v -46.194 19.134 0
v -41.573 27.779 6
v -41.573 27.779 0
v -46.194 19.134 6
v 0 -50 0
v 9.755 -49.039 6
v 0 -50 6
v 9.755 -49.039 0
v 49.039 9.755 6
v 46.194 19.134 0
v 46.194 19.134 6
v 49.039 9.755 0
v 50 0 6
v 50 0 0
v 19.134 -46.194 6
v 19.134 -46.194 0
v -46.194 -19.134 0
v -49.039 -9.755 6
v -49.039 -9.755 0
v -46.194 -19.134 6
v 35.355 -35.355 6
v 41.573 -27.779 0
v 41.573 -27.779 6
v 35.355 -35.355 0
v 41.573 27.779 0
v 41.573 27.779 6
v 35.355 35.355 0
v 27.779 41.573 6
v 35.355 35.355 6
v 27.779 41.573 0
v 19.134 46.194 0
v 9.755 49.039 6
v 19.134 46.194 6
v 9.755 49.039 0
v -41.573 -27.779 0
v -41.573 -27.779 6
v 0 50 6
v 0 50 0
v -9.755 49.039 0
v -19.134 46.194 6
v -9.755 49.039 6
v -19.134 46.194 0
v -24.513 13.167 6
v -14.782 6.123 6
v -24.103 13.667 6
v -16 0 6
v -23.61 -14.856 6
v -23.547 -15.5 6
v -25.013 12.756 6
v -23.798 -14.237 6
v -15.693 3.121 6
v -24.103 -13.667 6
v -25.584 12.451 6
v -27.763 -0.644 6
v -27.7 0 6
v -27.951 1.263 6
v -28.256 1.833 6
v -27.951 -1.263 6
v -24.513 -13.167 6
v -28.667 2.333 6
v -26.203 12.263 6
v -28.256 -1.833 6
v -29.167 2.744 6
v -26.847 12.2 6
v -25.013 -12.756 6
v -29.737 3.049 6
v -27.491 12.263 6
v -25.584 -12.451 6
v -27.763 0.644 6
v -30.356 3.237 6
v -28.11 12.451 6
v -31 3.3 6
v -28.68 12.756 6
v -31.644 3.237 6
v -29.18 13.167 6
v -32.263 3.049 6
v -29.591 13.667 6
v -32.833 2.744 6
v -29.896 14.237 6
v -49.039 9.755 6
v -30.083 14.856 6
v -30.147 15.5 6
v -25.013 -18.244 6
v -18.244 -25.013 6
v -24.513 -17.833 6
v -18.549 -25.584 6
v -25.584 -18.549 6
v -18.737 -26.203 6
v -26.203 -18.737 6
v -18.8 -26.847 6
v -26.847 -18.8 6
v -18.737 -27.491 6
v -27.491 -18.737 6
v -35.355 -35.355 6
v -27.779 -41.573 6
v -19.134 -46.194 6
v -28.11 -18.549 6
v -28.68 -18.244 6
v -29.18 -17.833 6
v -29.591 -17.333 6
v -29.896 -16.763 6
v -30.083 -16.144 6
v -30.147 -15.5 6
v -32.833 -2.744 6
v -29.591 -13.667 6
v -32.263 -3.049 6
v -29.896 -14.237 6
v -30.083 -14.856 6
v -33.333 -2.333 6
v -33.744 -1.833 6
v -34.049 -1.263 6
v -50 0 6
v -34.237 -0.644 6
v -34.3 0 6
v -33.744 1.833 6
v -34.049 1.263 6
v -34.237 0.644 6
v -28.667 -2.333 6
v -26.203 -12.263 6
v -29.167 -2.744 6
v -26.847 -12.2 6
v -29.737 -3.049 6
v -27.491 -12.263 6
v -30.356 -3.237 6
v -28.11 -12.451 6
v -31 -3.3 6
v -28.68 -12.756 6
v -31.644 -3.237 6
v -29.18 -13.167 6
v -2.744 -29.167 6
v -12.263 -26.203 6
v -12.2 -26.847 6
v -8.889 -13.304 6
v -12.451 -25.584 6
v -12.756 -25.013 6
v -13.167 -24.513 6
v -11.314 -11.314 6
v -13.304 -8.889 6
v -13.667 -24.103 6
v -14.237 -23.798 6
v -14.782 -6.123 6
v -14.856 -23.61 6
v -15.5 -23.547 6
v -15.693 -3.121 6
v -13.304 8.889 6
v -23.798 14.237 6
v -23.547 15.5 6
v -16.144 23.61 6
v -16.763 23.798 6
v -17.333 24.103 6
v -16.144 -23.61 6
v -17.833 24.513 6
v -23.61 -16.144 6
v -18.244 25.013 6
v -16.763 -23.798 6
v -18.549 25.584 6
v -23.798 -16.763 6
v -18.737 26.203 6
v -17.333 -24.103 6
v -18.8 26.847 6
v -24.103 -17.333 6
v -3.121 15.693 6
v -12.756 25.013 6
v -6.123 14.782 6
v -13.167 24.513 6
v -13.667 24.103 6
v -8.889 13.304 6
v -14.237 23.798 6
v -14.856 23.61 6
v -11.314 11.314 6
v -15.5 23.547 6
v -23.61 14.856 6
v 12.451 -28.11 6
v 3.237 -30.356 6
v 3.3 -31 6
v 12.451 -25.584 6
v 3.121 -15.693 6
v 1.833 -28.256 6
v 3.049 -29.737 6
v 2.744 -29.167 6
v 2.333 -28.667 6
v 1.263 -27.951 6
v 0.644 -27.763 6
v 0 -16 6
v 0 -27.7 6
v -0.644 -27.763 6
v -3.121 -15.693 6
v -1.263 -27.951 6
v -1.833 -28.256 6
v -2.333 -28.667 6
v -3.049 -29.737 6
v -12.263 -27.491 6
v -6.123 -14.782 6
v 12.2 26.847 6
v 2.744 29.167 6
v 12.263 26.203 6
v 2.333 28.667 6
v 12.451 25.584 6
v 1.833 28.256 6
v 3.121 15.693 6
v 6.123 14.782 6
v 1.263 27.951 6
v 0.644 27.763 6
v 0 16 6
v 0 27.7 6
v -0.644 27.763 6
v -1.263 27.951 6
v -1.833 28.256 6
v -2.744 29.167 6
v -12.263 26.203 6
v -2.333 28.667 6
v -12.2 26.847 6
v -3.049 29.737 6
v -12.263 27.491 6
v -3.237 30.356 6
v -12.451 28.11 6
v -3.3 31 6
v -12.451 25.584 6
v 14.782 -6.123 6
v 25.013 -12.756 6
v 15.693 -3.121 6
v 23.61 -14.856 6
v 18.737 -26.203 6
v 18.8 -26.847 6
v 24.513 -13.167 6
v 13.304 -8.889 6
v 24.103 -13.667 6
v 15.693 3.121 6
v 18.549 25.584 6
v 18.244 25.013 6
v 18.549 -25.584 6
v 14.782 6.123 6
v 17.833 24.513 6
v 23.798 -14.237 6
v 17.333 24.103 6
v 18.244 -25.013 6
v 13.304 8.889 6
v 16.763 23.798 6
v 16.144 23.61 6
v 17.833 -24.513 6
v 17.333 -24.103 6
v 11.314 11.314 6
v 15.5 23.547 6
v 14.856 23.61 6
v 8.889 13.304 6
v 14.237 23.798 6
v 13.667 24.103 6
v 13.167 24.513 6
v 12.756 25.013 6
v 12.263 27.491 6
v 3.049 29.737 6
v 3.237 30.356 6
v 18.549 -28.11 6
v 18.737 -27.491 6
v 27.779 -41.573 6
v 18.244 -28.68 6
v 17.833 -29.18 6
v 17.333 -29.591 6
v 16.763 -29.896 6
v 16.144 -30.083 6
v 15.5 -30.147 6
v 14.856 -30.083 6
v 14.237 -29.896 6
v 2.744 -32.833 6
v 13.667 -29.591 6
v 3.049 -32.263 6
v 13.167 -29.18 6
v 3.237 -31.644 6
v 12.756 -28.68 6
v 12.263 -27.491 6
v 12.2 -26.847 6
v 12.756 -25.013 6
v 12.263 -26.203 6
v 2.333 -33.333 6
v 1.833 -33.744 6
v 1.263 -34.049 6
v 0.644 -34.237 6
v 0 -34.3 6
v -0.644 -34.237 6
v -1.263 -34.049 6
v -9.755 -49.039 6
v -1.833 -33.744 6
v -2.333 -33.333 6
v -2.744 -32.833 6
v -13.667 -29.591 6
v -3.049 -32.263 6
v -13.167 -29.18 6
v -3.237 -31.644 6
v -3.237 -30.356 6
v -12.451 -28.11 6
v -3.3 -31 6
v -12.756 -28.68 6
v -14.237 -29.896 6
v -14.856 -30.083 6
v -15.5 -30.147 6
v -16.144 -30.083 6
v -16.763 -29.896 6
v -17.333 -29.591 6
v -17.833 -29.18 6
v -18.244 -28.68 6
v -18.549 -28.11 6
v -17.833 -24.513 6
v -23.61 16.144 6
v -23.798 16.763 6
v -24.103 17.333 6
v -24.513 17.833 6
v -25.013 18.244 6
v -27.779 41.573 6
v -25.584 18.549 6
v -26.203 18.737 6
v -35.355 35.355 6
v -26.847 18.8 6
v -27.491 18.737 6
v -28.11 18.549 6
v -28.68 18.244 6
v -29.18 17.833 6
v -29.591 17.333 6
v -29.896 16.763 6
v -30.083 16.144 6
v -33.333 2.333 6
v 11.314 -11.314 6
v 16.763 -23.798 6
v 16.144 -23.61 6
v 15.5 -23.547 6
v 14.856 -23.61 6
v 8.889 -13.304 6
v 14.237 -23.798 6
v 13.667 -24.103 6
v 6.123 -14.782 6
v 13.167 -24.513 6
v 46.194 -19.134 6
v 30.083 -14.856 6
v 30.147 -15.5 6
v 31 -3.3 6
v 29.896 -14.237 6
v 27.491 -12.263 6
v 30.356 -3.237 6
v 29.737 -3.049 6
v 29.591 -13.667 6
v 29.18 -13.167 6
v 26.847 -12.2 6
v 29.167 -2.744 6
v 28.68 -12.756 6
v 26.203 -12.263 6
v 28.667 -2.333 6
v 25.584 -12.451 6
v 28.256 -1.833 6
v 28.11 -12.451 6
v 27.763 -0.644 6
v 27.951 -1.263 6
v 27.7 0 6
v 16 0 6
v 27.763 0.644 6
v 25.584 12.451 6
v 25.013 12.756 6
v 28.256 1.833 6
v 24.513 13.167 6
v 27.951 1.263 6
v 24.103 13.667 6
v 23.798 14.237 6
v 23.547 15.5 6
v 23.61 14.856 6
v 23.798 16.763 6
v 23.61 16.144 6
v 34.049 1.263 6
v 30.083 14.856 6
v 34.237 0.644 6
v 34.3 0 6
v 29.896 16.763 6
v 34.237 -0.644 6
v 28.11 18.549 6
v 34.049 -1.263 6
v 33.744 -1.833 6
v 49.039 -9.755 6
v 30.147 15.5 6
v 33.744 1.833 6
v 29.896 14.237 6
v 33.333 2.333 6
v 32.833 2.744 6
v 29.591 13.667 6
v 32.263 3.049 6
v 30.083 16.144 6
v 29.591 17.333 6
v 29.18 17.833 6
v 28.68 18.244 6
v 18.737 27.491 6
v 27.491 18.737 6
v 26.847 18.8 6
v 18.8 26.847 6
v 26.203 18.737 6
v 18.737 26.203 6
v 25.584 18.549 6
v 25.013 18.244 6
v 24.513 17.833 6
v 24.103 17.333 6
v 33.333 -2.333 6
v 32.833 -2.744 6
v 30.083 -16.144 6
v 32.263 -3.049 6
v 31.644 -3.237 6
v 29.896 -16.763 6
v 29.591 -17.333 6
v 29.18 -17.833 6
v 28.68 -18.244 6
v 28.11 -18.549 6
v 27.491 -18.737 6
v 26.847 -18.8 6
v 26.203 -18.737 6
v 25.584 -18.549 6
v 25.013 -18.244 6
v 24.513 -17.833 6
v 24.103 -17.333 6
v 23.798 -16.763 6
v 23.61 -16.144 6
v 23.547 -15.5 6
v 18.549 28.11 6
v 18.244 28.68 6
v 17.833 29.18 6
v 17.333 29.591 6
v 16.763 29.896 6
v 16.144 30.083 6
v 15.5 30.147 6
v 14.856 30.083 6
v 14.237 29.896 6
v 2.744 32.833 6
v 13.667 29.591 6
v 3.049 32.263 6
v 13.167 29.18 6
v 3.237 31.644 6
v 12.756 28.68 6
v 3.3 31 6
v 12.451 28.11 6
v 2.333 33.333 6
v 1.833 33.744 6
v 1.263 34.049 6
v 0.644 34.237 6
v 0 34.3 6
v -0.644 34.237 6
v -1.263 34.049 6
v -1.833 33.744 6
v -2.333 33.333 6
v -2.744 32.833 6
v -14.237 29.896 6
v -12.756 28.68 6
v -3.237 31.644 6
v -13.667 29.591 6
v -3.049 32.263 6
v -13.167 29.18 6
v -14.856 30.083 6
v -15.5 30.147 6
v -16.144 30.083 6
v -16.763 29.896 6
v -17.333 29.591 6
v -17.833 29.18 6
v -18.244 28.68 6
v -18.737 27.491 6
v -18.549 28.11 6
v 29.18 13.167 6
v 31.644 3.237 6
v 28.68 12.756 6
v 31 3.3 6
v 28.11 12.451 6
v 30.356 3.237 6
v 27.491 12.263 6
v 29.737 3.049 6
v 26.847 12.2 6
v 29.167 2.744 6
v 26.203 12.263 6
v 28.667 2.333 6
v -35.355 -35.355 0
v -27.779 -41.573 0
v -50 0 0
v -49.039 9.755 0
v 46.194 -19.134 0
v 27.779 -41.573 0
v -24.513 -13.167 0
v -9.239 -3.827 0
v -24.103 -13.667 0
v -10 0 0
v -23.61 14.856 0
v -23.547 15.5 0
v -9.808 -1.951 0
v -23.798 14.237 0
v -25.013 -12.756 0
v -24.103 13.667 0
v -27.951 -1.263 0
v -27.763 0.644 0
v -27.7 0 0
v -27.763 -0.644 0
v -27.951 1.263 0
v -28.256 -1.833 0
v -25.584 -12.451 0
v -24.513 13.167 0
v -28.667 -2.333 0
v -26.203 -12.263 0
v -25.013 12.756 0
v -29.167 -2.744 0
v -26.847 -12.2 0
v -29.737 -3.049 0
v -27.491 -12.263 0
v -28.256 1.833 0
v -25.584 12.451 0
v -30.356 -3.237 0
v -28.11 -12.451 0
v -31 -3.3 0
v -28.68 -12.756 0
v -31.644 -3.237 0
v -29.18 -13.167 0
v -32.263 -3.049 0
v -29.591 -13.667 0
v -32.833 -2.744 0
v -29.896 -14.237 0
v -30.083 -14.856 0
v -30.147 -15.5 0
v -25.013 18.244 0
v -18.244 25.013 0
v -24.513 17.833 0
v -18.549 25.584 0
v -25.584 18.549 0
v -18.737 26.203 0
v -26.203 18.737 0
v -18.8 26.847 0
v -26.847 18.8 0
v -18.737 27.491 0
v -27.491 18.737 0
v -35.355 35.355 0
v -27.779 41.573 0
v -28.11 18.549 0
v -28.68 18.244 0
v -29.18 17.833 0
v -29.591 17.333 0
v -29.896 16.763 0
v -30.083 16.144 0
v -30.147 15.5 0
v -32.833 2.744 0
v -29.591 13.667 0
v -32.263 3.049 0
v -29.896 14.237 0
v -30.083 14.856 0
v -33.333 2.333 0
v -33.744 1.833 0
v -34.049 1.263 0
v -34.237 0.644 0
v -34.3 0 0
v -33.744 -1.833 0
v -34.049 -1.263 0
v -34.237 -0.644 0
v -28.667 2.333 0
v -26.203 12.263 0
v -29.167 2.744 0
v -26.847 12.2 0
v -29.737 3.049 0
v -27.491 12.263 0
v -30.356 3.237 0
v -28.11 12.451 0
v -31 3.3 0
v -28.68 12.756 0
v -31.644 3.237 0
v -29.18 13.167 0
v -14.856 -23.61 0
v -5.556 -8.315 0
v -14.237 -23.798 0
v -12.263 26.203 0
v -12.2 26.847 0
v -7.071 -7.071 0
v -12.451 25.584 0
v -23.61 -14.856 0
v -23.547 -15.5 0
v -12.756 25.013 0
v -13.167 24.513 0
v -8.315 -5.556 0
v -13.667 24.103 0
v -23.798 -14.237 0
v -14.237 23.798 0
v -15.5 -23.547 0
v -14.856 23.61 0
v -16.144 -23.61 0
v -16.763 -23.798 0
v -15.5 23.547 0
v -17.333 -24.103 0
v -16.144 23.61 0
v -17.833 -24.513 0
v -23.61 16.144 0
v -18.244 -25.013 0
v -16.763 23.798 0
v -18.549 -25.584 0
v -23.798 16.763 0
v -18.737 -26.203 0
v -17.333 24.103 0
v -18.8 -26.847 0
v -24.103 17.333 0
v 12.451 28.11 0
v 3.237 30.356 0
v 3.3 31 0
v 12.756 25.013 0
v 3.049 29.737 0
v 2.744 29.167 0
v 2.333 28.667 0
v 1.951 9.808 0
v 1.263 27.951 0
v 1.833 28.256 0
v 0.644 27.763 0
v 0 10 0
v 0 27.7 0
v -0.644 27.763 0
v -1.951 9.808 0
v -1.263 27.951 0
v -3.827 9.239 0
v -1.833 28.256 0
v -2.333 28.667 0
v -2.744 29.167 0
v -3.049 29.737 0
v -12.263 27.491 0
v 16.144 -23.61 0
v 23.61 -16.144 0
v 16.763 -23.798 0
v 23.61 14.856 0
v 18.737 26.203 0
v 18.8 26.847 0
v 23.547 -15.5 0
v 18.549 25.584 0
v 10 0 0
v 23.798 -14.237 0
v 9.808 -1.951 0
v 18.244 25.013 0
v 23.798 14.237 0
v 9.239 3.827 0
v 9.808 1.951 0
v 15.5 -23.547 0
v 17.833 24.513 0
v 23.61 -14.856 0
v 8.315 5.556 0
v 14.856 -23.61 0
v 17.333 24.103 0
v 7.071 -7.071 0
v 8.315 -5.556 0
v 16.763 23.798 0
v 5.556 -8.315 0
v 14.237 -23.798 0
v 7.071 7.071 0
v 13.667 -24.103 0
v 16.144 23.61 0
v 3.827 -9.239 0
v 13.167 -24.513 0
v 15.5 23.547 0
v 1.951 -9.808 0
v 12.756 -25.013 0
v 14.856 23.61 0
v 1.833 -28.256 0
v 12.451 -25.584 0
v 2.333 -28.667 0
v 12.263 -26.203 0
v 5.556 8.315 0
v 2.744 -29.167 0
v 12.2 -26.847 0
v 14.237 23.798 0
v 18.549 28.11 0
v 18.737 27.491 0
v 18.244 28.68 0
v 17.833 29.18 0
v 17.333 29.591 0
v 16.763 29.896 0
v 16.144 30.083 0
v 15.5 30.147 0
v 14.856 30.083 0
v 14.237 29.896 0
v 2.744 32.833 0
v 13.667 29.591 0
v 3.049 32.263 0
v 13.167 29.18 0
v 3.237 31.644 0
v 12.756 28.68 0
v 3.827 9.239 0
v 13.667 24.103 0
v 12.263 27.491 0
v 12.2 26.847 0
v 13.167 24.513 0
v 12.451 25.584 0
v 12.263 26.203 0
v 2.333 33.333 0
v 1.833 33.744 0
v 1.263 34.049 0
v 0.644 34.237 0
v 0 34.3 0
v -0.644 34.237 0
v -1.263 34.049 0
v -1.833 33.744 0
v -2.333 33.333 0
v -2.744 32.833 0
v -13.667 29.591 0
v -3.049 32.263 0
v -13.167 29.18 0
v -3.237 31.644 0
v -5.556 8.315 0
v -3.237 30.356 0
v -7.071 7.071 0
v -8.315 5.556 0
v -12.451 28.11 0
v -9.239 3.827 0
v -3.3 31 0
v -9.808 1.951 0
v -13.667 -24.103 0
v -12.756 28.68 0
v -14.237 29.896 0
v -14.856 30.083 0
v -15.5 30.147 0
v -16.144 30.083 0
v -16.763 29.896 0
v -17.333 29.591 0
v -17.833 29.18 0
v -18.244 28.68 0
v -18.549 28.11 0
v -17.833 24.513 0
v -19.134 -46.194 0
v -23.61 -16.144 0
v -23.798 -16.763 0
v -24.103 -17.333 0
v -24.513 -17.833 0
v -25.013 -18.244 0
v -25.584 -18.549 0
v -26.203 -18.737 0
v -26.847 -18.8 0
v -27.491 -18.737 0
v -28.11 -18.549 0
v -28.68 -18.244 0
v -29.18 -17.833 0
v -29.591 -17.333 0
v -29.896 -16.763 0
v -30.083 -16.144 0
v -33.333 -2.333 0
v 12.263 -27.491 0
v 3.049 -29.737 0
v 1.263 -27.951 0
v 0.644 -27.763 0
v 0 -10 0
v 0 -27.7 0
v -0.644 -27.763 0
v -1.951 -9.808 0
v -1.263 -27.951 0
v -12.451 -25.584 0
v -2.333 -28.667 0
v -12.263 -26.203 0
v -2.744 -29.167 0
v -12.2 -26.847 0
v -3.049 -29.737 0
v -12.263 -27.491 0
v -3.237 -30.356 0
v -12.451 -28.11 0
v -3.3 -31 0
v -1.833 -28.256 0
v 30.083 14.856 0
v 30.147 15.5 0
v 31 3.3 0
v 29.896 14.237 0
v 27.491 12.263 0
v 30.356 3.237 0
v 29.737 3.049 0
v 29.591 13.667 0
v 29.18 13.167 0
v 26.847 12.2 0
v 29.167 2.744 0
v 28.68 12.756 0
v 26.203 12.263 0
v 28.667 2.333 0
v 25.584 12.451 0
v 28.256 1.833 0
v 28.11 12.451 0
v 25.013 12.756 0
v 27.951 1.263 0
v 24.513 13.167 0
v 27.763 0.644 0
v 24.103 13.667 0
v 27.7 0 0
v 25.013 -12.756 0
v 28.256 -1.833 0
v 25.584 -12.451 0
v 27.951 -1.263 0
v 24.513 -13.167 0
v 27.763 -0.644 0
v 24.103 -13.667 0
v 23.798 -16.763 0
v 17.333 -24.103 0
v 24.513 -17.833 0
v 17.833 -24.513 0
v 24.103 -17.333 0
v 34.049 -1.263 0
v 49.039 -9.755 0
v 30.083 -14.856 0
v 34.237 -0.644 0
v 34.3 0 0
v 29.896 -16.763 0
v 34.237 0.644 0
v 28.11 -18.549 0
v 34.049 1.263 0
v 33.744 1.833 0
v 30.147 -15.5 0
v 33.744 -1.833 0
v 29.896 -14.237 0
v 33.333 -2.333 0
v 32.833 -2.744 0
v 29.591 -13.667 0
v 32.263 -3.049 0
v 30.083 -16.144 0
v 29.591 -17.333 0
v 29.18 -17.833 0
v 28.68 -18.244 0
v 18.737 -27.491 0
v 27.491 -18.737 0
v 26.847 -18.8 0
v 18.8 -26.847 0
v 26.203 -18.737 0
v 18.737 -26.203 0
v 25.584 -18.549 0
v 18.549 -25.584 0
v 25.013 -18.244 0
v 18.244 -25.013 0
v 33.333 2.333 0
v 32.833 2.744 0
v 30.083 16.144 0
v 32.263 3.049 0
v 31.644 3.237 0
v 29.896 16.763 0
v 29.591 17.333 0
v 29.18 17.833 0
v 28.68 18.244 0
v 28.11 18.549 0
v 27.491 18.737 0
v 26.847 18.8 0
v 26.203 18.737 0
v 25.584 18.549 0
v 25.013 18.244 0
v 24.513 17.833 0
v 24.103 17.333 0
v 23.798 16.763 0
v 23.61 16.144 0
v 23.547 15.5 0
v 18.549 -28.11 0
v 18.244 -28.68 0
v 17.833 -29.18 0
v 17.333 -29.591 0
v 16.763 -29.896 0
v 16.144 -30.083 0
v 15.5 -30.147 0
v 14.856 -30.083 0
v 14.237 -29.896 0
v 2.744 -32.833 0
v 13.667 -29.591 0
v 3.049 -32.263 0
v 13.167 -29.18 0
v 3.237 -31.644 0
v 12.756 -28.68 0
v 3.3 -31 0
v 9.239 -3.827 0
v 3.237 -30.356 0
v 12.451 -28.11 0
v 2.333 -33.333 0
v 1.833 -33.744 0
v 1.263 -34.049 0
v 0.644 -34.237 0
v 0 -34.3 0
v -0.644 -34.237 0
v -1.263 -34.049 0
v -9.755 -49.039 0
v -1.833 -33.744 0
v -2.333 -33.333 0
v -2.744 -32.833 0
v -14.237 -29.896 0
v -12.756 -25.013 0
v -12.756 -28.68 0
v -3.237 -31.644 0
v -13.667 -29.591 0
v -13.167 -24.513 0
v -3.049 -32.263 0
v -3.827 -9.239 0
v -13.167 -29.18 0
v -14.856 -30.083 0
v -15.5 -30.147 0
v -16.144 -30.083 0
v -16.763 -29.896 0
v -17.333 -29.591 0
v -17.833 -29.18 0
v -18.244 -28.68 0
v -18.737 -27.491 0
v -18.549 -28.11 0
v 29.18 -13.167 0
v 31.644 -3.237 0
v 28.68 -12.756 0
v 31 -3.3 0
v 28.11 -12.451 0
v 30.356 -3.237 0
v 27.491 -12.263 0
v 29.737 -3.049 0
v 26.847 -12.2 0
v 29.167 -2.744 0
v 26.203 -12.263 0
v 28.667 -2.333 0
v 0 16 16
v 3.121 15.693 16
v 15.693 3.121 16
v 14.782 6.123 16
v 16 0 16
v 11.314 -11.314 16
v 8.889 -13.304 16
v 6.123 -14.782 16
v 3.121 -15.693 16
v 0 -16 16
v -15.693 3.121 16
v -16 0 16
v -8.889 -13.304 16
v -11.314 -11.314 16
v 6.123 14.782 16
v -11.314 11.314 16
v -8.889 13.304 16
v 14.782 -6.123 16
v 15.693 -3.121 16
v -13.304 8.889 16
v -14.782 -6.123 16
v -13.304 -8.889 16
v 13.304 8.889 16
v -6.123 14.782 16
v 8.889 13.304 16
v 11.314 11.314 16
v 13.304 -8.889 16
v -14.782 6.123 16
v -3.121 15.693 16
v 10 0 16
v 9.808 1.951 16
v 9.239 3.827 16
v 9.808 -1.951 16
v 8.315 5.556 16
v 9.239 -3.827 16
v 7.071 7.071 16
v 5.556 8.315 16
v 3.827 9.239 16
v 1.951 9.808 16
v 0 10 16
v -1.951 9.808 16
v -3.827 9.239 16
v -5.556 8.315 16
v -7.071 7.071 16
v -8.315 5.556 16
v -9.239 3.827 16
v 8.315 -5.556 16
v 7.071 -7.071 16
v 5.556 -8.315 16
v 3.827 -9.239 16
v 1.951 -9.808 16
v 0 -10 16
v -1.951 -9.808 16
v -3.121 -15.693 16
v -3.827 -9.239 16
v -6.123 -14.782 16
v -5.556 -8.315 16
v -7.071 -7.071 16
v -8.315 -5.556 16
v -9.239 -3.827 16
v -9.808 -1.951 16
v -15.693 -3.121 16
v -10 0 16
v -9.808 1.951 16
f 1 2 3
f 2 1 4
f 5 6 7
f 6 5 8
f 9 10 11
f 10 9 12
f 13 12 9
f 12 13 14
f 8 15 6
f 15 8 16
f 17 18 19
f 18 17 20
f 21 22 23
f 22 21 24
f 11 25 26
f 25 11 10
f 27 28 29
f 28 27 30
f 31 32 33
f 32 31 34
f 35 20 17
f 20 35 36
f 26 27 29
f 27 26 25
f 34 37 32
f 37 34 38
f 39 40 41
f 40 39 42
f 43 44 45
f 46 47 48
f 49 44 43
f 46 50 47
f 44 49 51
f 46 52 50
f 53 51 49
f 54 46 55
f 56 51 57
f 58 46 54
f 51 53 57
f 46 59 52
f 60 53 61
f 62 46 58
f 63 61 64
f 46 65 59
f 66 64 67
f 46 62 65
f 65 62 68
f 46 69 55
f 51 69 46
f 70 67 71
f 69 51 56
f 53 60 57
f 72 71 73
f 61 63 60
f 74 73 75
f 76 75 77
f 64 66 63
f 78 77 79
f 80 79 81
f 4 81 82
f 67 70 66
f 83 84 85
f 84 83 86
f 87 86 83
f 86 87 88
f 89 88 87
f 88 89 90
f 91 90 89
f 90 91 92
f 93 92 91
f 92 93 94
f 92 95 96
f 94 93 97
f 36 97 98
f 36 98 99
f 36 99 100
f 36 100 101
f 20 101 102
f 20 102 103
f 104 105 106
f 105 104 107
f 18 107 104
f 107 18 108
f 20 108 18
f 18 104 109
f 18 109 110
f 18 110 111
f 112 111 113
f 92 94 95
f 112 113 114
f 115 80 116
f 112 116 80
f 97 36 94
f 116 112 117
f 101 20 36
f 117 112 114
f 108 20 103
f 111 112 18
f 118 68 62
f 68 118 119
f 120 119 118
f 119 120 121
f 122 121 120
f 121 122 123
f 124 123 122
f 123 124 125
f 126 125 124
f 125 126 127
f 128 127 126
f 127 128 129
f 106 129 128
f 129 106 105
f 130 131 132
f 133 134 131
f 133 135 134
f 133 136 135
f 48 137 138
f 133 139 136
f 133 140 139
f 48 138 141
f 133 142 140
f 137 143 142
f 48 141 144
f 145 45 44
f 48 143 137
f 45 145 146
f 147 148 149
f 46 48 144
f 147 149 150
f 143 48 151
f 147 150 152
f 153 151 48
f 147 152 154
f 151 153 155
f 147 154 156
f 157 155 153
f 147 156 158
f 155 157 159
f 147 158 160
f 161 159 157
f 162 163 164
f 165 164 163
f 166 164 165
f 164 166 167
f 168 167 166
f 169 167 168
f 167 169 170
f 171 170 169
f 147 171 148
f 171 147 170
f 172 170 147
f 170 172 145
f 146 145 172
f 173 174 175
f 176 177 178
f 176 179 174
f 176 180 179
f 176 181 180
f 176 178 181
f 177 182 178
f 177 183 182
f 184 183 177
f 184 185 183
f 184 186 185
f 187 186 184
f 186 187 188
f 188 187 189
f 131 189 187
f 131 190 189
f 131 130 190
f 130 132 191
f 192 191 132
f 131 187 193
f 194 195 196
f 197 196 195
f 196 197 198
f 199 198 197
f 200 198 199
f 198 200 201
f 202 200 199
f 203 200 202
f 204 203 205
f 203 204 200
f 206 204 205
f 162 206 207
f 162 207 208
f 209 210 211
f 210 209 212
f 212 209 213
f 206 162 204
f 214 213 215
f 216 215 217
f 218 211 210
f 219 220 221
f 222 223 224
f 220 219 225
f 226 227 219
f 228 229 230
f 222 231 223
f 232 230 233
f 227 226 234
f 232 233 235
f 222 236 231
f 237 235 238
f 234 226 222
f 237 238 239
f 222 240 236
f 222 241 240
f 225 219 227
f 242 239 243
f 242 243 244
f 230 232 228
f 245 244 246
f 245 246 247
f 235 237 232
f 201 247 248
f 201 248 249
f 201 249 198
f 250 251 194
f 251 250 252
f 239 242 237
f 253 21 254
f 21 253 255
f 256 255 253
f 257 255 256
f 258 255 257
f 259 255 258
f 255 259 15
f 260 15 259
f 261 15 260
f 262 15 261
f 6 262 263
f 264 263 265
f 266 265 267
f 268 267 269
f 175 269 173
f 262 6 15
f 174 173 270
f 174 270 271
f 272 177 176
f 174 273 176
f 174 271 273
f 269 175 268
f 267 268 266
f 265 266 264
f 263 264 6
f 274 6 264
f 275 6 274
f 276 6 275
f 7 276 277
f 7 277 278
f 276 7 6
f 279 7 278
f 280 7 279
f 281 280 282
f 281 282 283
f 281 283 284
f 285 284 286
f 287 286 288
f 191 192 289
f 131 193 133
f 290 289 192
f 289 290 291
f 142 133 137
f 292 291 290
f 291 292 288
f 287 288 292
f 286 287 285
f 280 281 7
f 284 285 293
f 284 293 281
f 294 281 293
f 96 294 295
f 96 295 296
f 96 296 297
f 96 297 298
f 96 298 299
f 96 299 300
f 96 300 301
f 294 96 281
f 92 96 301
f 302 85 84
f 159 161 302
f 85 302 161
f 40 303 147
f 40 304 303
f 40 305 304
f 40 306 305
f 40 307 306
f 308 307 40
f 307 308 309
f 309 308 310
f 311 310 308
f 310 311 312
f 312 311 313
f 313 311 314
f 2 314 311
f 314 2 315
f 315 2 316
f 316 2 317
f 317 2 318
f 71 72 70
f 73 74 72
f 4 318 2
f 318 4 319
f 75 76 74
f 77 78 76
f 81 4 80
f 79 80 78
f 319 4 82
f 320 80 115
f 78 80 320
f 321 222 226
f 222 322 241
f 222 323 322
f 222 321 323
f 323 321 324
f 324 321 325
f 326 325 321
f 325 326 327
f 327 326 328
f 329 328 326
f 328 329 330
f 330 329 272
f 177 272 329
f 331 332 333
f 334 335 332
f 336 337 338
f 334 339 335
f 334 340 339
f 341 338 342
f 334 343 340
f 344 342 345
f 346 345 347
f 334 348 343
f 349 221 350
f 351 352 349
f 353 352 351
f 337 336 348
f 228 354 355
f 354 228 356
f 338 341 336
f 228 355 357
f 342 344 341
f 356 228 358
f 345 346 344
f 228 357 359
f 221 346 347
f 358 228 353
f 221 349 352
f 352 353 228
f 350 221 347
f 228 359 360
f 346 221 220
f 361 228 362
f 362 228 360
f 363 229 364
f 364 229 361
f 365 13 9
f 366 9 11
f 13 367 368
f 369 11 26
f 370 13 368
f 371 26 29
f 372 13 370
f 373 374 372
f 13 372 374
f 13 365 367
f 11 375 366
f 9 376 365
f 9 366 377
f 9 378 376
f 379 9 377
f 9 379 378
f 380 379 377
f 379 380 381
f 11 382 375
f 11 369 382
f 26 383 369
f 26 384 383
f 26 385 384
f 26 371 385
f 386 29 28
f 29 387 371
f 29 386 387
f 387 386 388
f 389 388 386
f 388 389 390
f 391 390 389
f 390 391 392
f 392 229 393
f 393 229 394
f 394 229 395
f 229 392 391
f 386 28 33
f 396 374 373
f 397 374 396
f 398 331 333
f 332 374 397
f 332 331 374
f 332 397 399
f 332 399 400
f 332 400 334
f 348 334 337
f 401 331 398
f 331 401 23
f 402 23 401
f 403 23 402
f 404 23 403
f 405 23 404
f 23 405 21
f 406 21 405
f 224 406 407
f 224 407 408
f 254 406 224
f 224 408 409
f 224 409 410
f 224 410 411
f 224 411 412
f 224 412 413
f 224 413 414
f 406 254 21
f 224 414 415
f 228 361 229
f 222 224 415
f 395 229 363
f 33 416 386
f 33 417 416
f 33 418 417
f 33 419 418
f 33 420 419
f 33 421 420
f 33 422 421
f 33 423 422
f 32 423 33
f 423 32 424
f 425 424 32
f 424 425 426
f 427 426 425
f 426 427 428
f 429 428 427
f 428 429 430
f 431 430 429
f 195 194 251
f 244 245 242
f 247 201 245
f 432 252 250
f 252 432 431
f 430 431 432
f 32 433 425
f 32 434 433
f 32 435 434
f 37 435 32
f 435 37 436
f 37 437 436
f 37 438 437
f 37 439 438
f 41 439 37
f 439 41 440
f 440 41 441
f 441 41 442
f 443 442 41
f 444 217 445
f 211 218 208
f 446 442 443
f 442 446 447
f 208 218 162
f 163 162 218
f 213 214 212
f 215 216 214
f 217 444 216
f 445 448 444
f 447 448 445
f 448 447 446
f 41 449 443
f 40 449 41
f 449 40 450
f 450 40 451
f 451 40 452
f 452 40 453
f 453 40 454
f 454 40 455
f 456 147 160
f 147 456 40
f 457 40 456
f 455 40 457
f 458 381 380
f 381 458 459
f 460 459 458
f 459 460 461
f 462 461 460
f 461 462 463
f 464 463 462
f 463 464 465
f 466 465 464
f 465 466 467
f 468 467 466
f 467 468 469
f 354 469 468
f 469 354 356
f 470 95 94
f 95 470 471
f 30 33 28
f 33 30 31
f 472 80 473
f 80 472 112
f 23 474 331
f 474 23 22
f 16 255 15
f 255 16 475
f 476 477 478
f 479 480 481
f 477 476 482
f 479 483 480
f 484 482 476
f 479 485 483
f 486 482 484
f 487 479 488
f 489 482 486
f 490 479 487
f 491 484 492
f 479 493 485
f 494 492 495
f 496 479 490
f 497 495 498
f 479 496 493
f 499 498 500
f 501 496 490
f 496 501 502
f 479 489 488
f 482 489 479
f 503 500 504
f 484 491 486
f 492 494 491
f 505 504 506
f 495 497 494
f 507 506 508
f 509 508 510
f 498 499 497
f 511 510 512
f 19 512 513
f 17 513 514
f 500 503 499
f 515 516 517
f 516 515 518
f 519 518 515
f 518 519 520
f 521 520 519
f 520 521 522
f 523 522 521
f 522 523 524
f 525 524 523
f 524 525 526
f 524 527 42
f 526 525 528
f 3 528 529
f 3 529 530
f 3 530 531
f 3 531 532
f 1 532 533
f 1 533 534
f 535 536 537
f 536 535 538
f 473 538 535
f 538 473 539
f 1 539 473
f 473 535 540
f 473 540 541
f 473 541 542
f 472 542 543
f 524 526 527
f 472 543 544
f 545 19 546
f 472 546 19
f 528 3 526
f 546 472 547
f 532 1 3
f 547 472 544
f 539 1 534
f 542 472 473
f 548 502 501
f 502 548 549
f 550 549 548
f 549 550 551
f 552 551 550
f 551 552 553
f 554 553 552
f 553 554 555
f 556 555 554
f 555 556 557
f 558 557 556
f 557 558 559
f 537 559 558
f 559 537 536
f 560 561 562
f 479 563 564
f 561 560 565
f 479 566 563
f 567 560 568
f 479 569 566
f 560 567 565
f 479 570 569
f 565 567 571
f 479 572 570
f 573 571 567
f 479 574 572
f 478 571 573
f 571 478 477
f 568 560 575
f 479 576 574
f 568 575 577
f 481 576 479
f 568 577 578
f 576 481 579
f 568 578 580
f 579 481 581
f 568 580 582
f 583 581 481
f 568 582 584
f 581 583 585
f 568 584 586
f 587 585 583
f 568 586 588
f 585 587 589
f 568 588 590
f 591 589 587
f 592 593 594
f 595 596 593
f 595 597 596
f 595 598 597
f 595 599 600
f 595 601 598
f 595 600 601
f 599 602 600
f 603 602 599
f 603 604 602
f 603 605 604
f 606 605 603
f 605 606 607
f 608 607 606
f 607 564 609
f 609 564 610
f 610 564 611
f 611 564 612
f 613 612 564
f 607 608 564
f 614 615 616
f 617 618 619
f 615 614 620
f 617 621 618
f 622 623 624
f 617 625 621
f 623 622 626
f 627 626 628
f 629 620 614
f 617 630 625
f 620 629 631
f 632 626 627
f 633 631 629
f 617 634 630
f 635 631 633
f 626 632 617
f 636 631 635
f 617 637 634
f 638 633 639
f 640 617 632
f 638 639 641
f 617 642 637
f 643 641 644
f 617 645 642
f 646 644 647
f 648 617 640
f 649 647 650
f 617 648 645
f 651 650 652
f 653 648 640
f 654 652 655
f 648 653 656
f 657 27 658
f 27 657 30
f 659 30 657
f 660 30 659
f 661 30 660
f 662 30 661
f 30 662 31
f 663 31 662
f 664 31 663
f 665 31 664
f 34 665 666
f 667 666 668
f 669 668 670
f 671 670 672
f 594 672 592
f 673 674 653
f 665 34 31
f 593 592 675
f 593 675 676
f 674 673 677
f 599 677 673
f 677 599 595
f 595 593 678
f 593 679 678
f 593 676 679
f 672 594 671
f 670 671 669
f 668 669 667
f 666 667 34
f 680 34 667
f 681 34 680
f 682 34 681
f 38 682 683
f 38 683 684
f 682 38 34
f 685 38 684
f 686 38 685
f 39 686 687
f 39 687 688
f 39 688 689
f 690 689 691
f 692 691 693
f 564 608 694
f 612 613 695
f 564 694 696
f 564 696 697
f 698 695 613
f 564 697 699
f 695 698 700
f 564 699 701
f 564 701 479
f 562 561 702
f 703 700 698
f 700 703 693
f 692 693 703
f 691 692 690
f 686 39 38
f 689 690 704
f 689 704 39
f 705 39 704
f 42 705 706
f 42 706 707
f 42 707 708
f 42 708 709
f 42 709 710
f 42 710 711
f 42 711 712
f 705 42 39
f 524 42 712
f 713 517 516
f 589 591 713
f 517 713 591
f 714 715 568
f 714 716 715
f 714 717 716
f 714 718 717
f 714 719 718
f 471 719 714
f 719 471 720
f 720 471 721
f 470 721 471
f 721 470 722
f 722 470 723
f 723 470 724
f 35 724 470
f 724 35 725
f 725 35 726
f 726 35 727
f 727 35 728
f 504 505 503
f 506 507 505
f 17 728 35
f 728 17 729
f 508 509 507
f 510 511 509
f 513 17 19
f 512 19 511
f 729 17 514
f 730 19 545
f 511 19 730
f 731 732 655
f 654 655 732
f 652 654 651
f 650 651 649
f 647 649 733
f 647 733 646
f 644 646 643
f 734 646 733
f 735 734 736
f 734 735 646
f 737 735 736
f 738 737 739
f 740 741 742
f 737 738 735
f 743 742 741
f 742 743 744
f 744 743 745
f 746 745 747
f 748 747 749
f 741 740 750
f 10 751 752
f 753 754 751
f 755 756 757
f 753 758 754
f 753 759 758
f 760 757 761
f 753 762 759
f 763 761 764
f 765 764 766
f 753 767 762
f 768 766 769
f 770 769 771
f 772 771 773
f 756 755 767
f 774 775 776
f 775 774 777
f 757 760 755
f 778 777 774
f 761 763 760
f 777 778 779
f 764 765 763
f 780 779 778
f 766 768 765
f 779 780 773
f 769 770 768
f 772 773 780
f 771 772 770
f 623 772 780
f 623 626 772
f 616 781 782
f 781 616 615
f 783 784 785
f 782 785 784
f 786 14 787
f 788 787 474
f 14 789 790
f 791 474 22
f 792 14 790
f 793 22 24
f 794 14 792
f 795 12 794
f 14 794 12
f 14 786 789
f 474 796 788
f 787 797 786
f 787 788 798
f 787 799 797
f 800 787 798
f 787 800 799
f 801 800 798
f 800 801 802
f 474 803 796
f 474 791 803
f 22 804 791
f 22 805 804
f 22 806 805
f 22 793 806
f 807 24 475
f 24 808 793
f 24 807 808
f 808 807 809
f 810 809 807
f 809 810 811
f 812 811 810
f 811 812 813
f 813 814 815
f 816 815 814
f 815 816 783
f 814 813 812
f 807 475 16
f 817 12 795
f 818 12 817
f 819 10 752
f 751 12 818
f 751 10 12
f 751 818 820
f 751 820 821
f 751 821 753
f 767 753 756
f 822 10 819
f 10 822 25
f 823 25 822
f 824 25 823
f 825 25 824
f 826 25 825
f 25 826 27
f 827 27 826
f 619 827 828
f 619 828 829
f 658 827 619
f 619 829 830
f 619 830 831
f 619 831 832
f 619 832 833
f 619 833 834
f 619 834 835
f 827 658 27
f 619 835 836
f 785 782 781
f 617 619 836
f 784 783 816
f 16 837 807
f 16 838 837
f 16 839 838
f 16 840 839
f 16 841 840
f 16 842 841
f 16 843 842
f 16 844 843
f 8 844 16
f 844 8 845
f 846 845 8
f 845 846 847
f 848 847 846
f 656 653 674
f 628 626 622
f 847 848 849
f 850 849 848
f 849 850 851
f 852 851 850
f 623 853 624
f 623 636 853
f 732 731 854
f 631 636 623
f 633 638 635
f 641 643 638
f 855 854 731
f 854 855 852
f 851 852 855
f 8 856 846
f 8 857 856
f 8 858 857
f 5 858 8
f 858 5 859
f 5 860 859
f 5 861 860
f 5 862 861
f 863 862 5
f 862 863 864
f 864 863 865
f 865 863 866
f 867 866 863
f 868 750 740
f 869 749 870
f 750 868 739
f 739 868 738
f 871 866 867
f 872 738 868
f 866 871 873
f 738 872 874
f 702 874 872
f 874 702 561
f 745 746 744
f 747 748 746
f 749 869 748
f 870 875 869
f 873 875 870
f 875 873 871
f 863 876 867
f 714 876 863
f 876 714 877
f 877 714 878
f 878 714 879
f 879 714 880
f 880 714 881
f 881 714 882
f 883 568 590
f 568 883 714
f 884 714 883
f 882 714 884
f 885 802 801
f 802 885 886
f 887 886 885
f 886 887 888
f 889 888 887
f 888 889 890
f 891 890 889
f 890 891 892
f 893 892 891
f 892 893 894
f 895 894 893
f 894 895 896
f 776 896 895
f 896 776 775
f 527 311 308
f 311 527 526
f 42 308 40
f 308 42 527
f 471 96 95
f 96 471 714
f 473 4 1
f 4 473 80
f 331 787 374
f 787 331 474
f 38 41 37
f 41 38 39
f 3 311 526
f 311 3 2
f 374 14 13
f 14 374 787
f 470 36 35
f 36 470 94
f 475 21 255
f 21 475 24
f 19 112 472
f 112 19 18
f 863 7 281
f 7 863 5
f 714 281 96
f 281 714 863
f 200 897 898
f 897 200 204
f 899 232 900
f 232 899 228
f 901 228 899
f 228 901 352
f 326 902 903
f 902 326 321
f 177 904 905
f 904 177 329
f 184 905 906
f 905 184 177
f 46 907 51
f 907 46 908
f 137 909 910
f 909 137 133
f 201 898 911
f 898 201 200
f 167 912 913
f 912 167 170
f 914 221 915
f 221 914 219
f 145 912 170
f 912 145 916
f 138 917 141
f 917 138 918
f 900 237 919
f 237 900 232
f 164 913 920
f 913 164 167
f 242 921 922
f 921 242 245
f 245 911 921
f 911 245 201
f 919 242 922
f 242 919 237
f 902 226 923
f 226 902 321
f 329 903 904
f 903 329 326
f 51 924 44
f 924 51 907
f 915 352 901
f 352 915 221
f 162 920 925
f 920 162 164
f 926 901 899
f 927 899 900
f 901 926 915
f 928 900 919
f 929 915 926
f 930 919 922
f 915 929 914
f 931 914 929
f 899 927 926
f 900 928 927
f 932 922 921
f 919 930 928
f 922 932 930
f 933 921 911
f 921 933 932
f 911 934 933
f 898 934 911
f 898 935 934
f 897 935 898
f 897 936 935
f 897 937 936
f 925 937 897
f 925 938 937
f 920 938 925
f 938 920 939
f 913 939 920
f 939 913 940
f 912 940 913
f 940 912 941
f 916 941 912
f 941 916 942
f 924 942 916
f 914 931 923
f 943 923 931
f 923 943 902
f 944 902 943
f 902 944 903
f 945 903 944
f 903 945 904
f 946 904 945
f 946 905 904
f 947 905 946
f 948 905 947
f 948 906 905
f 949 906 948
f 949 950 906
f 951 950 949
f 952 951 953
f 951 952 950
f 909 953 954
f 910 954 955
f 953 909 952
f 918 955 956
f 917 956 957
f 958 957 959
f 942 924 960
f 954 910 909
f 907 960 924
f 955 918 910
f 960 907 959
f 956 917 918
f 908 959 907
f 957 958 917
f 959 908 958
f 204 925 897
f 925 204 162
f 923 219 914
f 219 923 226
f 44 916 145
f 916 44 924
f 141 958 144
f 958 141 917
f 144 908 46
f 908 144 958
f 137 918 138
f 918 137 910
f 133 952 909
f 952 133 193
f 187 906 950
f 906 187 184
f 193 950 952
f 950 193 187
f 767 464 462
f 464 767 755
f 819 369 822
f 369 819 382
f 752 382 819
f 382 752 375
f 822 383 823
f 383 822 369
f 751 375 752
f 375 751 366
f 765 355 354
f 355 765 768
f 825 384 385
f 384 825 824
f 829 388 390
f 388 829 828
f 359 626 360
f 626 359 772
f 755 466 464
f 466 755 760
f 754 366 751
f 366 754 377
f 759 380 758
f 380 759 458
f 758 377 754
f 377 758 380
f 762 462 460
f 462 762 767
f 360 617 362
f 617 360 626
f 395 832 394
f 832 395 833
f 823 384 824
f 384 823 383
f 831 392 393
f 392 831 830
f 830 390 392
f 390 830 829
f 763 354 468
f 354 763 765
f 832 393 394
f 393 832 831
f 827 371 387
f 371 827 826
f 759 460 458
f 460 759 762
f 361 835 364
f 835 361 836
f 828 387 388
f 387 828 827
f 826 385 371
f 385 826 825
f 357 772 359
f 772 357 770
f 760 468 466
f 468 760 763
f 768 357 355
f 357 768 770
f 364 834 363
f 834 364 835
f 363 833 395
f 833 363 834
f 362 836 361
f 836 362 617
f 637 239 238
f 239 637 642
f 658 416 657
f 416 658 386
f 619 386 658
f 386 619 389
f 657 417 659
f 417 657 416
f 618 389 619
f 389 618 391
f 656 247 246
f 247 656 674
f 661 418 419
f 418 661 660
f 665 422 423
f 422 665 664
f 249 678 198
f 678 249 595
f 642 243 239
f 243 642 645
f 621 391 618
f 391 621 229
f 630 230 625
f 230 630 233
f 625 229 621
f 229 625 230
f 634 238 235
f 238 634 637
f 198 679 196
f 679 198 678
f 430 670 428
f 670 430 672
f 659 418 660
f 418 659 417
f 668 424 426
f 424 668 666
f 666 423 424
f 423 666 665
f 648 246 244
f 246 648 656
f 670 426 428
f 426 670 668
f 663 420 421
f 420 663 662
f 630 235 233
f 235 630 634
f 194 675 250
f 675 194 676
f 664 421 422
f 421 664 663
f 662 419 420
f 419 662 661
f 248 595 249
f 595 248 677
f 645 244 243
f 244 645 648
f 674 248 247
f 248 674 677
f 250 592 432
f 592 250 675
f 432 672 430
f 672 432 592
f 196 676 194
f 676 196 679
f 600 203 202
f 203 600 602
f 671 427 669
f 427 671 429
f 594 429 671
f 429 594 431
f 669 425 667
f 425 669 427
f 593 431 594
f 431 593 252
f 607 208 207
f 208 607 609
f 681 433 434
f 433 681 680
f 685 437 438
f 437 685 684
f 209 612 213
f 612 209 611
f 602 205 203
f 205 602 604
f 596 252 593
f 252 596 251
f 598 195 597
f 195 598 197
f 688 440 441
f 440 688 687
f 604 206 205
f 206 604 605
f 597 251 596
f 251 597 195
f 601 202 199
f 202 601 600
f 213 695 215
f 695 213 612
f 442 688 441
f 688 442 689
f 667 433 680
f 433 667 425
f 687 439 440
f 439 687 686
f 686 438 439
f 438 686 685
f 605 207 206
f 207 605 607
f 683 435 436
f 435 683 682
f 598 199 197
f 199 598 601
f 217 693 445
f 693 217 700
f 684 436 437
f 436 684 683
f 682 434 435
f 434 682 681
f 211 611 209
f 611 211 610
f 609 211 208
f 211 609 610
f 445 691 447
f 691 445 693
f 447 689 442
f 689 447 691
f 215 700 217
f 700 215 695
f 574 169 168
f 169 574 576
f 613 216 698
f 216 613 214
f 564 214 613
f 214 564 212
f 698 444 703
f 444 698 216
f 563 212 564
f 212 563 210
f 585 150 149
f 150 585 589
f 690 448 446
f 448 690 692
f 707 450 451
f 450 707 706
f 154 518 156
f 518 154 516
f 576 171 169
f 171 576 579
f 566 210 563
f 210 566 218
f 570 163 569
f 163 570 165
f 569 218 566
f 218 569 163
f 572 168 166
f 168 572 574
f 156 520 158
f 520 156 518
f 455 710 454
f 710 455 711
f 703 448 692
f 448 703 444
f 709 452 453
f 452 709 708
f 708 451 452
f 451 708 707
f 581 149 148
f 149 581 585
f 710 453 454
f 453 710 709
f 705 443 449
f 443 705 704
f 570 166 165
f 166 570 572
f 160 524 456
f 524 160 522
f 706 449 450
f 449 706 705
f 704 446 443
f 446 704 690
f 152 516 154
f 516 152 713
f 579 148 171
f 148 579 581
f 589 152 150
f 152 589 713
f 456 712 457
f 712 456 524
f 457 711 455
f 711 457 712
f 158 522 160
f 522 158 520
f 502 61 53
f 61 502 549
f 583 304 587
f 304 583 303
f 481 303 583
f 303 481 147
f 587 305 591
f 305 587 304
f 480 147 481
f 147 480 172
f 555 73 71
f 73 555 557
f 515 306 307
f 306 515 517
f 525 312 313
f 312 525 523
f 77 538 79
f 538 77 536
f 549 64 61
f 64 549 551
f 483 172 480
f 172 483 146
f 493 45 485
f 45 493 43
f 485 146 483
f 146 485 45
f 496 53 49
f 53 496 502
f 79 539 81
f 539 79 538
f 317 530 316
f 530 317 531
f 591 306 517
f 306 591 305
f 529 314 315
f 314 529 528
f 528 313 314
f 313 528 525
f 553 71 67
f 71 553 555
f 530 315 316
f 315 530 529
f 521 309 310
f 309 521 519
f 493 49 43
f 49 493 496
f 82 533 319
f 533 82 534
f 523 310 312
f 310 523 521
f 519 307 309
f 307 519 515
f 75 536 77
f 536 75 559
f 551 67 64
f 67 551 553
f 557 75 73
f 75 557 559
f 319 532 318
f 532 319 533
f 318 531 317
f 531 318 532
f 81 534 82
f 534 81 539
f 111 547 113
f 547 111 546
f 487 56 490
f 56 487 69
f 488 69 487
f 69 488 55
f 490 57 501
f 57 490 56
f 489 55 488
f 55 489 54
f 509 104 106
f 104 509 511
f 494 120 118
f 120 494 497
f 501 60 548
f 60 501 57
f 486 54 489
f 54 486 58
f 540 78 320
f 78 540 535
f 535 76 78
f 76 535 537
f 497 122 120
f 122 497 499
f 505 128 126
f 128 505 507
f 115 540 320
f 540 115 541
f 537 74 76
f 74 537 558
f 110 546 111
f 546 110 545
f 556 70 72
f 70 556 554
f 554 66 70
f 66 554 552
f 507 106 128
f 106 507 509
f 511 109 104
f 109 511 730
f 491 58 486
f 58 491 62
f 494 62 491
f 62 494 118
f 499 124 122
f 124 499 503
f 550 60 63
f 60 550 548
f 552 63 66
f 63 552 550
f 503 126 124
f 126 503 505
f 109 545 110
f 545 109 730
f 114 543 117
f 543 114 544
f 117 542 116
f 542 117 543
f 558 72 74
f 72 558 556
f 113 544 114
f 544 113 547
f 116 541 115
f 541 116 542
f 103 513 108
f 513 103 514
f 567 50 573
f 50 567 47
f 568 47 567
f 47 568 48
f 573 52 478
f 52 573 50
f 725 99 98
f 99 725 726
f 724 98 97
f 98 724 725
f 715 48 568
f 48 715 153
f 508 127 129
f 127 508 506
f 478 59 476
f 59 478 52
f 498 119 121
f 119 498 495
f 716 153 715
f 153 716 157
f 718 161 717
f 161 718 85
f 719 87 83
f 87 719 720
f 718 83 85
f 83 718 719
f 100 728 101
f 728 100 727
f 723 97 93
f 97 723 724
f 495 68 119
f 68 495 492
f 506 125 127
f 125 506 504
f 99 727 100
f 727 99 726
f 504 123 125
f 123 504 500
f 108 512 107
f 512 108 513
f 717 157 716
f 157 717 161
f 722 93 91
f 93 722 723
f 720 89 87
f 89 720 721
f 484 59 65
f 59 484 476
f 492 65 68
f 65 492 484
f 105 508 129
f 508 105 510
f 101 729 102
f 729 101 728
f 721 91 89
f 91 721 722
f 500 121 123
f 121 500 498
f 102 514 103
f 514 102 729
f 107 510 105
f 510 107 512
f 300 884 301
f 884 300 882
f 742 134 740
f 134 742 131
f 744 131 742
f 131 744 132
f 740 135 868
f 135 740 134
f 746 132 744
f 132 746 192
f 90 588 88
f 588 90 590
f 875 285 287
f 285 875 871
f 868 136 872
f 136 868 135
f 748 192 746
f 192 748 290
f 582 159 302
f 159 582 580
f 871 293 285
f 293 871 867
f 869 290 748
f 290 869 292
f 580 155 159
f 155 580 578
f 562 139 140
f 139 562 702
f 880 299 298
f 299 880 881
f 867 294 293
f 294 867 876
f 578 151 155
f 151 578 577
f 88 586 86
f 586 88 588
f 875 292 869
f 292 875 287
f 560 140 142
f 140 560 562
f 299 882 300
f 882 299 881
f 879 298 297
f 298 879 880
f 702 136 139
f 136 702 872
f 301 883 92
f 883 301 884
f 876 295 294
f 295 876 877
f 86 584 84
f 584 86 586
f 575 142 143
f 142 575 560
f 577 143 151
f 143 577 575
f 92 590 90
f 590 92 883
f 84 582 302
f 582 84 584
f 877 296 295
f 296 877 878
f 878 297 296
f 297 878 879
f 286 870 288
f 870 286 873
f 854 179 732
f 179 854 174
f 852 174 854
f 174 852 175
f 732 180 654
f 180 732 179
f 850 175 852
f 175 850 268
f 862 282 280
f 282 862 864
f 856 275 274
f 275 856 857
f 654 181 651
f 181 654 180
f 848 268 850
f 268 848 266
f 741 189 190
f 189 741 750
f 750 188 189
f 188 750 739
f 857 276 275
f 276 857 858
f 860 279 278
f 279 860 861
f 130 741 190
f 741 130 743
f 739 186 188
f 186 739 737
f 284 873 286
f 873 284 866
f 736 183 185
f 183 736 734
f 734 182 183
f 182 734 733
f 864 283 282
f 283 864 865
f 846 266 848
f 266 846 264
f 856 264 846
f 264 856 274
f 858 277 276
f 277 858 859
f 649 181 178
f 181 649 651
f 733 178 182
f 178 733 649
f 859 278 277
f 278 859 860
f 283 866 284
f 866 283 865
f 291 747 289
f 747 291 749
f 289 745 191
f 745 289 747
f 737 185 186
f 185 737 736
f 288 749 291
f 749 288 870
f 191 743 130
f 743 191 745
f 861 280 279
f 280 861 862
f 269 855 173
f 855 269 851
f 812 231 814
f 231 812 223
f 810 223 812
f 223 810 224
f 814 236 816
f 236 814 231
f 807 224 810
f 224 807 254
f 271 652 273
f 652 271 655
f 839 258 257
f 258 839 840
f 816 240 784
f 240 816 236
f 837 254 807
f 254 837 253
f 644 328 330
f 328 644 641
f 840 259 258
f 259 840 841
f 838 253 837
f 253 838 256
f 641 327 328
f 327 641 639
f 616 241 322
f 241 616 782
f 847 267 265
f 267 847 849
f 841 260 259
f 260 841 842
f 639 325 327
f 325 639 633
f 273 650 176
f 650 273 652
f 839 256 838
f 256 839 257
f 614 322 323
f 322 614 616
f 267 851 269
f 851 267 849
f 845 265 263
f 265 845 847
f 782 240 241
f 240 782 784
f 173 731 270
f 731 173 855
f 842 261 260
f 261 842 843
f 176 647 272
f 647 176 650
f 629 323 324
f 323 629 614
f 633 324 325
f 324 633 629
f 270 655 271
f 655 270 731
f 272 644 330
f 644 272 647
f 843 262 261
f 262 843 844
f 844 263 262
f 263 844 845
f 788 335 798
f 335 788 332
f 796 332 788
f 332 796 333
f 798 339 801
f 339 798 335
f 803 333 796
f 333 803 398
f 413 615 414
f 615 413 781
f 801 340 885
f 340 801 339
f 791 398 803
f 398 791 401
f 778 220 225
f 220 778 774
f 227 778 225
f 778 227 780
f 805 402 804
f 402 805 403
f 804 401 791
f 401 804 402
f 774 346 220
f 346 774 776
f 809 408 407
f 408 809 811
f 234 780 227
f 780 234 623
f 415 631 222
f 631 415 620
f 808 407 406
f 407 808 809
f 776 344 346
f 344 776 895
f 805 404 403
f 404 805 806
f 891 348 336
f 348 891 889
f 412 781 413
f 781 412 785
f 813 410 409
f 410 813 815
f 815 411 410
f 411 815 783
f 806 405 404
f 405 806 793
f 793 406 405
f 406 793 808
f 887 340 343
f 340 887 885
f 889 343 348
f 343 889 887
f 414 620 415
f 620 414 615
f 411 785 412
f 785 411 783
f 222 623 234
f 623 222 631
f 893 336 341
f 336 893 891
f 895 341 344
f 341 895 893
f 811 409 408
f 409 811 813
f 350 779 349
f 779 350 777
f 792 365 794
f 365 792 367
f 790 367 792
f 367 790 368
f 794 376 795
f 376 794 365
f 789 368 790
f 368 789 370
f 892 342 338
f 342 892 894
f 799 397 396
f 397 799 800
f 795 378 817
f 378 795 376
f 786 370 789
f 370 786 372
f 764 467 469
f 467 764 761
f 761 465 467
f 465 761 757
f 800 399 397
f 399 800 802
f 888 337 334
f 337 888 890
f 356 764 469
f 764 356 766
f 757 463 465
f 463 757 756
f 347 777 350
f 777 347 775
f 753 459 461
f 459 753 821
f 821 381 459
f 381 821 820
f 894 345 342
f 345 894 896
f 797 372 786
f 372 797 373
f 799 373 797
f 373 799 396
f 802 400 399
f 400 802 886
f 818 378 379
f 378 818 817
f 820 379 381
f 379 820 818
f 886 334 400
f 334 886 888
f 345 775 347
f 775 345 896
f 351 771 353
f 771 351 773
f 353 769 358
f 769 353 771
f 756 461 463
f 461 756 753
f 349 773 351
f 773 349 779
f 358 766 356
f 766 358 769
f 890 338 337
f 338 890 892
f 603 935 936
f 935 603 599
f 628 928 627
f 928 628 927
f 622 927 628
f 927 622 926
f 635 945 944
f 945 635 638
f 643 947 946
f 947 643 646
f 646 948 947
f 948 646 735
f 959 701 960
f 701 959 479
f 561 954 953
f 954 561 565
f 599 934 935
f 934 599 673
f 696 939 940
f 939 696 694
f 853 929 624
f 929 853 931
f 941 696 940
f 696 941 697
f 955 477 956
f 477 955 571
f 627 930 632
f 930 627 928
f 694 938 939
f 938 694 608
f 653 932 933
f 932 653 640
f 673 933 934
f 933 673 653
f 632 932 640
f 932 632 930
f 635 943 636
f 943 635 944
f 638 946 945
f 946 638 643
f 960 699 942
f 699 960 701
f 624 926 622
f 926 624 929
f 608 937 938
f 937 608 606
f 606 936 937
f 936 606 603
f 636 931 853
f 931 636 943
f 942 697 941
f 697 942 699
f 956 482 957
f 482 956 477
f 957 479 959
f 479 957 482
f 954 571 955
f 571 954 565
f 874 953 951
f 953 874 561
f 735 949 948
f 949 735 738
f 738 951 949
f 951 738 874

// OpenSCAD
$fn = 32;

// ----------------------------------------------------------------------
// Flange Ø100 x 6
// 12 holes on a Ø62 bolt circle, bolted joints
// ----------------------------------------------------------------------

// --- parameters (mm) ---
flange_d = 100;  // outside diameter of the flange
seat_tol = 0.1;  // tolerance at the seating features
free_tol = 0.3;  // general tolerance on the free sizes
thickness = 6;   // flange thickness
holes = 12;      // number of bolt holes
pcd = 62;        // bolt circle diameter
start_deg = 30;  // angle of the first hole, from +X
hole_d = 6.6;    // bolt hole diameter
bore_d = 20;     // central through bore
hub_d = 32;      // hub outside diameter
hub_h = 10;      // hub height above the flange face (0 = no hub)

// --- derived feature positions (mm) ---
height = thickness + hub_h;  // = 16   overall height of the part
pcd_r = pcd / 2;             // = 31   bolt circle radius
hole_step = 360 / holes;     // = 30   angular pitch
feature_centers = [
  [pcd_r * cos(start_deg + 0 * hole_step), pcd_r * sin(start_deg + 0 * hole_step)],
  [pcd_r * cos(start_deg + 1 * hole_step), pcd_r * sin(start_deg + 1 * hole_step)],
  [pcd_r * cos(start_deg + 2 * hole_step), pcd_r * sin(start_deg + 2 * hole_step)],
  [pcd_r * cos(start_deg + 3 * hole_step), pcd_r * sin(start_deg + 3 * hole_step)],
  [pcd_r * cos(start_deg + 4 * hole_step), pcd_r * sin(start_deg + 4 * hole_step)],
  [pcd_r * cos(start_deg + 5 * hole_step), pcd_r * sin(start_deg + 5 * hole_step)],
  [pcd_r * cos(start_deg + 6 * hole_step), pcd_r * sin(start_deg + 6 * hole_step)],
  [pcd_r * cos(start_deg + 7 * hole_step), pcd_r * sin(start_deg + 7 * hole_step)],
  [pcd_r * cos(start_deg + 8 * hole_step), pcd_r * sin(start_deg + 8 * hole_step)],
  [pcd_r * cos(start_deg + 9 * hole_step), pcd_r * sin(start_deg + 9 * hole_step)],
  [pcd_r * cos(start_deg + 10 * hole_step), pcd_r * sin(start_deg + 10 * hole_step)],
  [pcd_r * cos(start_deg + 11 * hole_step), pcd_r * sin(start_deg + 11 * hole_step)]
];   // bolt hole centres on the pitch circle

// flange disc, every hole and the bore cut straight through
difference() {
  union() {
    cylinder(d = flange_d, h = thickness);
    cylinder(d = hub_d, h = height);  // hub, overlapped into the flange
  }
  translate([0, 0, -1]) cylinder(d = bore_d, h = height + 2);  // bore, through
  for (centre = feature_centers)
    translate([centre[0], centre[1], -1]) cylinder(d = hole_d, h = thickness + 2);
}
